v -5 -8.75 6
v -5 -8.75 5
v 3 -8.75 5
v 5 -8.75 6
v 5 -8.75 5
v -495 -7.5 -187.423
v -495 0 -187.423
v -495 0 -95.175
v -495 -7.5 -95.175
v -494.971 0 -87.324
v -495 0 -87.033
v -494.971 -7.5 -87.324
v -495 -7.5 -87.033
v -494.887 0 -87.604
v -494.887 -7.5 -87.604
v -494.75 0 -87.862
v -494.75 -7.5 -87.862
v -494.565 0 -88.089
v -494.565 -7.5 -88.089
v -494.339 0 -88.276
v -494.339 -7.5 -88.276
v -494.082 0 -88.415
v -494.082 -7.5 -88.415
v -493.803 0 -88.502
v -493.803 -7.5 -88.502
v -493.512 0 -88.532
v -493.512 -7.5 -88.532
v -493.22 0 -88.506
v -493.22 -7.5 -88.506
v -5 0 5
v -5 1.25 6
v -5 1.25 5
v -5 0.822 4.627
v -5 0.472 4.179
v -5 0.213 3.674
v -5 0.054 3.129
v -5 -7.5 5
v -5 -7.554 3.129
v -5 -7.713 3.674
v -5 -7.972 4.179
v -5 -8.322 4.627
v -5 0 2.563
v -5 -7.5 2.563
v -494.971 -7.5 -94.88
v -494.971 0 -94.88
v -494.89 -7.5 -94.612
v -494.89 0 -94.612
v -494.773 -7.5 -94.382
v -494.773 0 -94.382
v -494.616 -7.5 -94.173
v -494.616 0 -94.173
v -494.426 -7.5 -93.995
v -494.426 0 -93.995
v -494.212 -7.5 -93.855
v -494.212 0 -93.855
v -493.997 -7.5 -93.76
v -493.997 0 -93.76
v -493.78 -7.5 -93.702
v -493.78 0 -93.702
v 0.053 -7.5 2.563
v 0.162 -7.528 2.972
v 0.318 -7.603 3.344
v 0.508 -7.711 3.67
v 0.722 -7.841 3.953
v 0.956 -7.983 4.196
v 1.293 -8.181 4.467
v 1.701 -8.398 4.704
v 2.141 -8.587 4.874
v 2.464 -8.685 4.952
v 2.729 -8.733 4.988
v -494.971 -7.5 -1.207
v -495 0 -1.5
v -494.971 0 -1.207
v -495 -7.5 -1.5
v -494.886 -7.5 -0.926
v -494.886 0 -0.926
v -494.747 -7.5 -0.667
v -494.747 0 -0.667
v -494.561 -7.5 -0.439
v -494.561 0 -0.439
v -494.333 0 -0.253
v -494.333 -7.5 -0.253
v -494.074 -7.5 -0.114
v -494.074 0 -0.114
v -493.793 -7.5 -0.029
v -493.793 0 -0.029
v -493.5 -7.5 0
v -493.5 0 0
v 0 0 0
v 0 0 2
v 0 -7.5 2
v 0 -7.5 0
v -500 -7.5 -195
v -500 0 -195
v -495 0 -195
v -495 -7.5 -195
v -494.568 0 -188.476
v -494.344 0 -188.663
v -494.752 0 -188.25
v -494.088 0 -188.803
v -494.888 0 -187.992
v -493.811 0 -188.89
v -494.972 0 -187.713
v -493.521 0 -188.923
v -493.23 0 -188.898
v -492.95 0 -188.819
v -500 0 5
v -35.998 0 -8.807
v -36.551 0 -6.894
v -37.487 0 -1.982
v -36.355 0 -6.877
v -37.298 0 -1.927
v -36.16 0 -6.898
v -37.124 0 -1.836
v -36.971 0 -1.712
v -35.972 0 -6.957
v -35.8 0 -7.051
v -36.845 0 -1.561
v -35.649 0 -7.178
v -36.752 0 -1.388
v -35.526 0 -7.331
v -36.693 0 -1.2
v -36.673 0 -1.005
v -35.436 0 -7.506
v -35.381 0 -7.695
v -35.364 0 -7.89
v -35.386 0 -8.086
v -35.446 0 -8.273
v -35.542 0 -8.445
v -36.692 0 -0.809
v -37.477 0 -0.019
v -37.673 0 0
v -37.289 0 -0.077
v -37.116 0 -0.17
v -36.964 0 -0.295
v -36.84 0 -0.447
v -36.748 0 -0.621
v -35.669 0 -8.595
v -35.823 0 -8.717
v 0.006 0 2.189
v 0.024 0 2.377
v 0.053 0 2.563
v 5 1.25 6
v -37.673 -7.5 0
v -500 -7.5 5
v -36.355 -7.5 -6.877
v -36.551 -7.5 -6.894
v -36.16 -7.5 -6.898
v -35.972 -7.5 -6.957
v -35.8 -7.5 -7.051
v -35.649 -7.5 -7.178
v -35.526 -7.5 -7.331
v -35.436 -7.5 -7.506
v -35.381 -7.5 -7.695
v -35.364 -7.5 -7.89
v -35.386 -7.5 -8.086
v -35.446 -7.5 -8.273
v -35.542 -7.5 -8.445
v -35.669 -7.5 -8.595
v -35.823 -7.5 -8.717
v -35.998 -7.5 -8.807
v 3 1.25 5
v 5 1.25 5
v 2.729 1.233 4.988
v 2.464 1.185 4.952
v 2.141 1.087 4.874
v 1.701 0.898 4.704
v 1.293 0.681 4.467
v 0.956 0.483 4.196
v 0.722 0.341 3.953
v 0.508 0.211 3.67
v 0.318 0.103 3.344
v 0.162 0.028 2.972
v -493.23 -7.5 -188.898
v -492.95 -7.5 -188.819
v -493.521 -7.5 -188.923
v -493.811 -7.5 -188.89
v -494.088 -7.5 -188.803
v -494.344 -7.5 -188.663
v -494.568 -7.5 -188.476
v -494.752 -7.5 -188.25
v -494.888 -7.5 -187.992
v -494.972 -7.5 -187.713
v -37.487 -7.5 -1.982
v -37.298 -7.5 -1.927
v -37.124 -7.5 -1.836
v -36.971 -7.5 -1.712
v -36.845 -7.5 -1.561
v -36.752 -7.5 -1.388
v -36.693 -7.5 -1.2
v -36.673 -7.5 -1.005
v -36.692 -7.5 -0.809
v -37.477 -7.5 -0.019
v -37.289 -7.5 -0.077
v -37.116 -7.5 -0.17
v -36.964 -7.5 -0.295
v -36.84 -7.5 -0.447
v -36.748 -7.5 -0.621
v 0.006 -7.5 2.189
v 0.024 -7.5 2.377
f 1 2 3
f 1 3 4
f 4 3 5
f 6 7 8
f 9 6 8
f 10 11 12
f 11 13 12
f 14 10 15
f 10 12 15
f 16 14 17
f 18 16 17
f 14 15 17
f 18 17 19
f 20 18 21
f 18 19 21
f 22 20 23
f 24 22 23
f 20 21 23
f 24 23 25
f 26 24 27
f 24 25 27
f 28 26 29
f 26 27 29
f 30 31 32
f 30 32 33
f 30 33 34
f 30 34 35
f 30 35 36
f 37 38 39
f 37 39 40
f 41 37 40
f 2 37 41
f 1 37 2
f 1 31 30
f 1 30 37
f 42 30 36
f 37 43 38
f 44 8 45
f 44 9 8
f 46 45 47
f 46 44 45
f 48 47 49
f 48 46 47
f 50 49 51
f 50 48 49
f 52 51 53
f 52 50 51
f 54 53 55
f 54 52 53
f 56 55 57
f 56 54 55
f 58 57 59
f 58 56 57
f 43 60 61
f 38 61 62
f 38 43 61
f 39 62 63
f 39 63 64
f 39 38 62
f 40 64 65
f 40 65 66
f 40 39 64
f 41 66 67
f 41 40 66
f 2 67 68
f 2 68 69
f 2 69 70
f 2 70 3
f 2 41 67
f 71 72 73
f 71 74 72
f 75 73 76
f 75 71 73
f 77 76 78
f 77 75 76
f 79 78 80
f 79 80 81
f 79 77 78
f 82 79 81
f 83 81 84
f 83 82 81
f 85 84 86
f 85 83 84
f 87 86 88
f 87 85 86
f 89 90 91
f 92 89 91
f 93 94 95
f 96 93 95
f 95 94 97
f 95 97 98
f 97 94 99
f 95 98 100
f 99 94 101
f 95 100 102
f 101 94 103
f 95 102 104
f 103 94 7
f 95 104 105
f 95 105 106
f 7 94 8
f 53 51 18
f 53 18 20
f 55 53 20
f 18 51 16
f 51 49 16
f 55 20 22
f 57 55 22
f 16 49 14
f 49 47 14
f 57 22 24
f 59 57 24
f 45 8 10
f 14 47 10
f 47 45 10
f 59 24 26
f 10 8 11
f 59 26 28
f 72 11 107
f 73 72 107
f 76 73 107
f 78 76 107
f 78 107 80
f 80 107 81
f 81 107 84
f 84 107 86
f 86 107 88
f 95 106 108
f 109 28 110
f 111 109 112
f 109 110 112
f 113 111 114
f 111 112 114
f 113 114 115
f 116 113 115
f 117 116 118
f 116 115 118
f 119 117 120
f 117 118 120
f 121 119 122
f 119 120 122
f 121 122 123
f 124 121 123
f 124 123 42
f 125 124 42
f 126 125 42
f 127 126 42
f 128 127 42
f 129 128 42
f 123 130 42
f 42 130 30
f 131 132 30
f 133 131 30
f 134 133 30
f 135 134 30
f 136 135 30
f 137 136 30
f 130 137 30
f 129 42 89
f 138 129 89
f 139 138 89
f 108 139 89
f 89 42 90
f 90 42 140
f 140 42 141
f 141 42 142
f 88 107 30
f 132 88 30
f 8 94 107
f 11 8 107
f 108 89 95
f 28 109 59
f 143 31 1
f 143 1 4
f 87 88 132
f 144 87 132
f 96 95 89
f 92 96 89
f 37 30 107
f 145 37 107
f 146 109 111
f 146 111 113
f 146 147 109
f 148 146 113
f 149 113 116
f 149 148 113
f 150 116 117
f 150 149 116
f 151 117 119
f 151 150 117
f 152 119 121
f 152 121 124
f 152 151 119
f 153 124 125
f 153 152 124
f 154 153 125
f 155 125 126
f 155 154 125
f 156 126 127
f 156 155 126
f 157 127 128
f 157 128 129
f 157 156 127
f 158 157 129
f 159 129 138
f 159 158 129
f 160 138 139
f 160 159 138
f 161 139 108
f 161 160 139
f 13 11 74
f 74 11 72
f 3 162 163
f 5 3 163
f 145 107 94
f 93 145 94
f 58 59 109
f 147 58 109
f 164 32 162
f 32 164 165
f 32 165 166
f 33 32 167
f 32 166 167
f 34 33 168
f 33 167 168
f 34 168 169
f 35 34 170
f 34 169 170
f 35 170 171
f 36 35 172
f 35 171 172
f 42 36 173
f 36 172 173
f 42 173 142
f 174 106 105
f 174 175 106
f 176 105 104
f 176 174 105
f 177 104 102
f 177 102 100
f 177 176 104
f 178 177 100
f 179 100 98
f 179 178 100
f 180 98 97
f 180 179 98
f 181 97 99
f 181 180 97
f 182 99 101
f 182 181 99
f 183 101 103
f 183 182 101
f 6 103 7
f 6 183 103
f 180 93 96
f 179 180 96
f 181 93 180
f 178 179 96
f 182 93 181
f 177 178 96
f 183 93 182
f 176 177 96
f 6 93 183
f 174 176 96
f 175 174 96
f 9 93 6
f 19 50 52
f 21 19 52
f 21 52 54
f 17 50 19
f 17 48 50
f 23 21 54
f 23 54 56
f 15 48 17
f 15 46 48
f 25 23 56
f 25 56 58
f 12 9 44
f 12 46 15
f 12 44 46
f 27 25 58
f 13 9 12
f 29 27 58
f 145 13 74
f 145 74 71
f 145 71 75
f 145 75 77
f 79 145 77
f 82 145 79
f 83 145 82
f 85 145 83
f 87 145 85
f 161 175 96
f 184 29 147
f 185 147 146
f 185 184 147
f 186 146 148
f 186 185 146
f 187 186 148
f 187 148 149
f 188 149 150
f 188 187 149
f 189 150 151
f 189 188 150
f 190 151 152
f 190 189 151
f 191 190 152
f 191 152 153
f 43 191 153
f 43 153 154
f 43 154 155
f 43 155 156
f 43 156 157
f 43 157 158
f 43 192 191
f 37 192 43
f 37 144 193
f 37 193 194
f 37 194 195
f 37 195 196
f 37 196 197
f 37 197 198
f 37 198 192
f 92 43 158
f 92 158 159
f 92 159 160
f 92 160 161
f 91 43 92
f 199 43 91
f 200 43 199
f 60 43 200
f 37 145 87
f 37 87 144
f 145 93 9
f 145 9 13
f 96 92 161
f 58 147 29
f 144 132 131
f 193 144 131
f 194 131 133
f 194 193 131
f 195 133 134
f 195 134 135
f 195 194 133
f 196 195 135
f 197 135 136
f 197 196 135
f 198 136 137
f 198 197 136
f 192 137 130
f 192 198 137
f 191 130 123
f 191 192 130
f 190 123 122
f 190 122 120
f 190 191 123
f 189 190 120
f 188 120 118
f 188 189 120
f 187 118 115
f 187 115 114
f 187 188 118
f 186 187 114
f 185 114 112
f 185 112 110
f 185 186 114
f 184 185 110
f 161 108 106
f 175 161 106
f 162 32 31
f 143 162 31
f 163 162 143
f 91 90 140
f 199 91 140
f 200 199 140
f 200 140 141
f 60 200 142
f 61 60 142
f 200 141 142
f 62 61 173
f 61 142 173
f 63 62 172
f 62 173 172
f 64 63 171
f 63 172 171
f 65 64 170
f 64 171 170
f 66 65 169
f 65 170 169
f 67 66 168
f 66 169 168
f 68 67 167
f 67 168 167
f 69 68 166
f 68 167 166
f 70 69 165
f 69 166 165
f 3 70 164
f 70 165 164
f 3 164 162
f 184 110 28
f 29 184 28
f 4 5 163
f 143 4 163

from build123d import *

# Parameters (mm, degrees)
F1_DEPTH     = 7.5
F2_R         = 1.5
F3_R         = 1.5
F4_F1_R      = 1
F4_F2_R      = 1
F5_W         = 10
F5_H         = 10
F6_DEPTH     = 1
F7_T1_DEPTH  = 5
F7_T3_DEPTH  = 7.5
F7_T9_DEPTH  = 11.0917464655
F7_T14_DEPTH = 15
F7_T22_DEPTH = 15
F7_T27_DEPTH = 11.0917464655


# Not quite as in the source:
# - a fillet or chamfer that OpenCascade refuses, or shapes differently, is made with other operations: its cross-section is extruded or revolved along the edge and cut away or added


with BuildPart() as f1:
    # F0 (on Front) → F1 (new body)
    with BuildSketch(Plane.XZ):
        Polygon((0, 0), (0, 5), (-14.5909318536, 5), (-495, 5), (-500, 5), (-500, 0), (-500, -195), (-495, -195), (-408.1860127931, -160.8005504943), align=None)
        Polygon((-26.1103633187, -4.911916504), (-410.018635385, -156.1485085302), (-495, -189.6260158027), (-495, -142.4539996661), (-495, -95.2819835295), (-495, -93.9333955313), (-494.06737982, -93.7563320577), align=None, mode=Mode.SUBTRACT)
        Polygon((-495, 0), (-27.044750547, 0), (-495, -88.8440800691), (-495, -44.4220400346), align=None, mode=Mode.SUBTRACT)
    extrude(amount=F1_DEPTH)

    # F2
    f2_edges = [f1.edges().sort_by_distance(p)[0] for p in [
        (-495, -3.75, -88.84408),
    ]]
    fillet(f2_edges, radius=F2_R)

    # F3
    f3_edges = [f1.edges().sort_by_distance(p)[0] for p in [
        (-495, -3.75, -93.933396),
        (-495, -3.75, 0),
        (-495, -3.75, -189.626016),
    ]]
    fillet(f3_edges, radius=F3_R)

    # F4: fillet of radius 1 on 2 edges, made by hand

    # F4_f1
    f4_f1_edges = [f1.edges().sort_by_distance(p)[0] for p in [
        (-27.044750547, -3.75, 0),
    ]]
    fillet(f4_f1_edges, radius=F4_F1_R)

    # F4_f2
    f4_f2_edges = [f1.edges().sort_by_distance(p)[0] for p in [
        (-26.1103633187, -3.75, -4.911916504),
    ]]
    fillet(f4_f2_edges, radius=F4_F2_R)

    # F5 (on face) → F6 (join)
    with BuildSketch(Plane.XY.offset(5)):
        with Locations((0, -3.75)):
            Rectangle(F5_W, F5_H)
    extrude(amount=F6_DEPTH)

    # F7: fillet of radius 3 on 3 edges, made by hand

    # F7_s2 → F7_t1 (join)
    with BuildSketch(Plane.YZ.offset(-5)):
        with BuildLine():
            ThreePointArc((-7.5, 2.5633014138), (-7.830730437, 3.9326078076), (-8.75, 5))
            Line((-8.75, 5), (-7.5, 5))
            Line((-7.5, 5), (-7.5, 2.5633014138))
        make_face()
        with BuildLine():
            ThreePointArc((1.25, 5), (0.330730437, 3.9326078076), (0, 2.5633014138))
            Line((0, 2.5633014138), (0, 5))
            Line((0, 5), (1.25, 5))
        make_face()
    extrude(amount=F7_T1_DEPTH)

    # F7_s4 → F7_t3 (join)
    with BuildSketch(Plane.XZ):
        with BuildLine():
            ThreePointArc((0, 2), (0.8786796564, 4.1213203436), (3, 5))
            Line((3, 5), (0, 5))
            Line((0, 5), (0, 2))
        make_face()
    extrude(amount=F7_T3_DEPTH)


with BuildPart() as f7_tool7:
    # F7_s8 → F7_t9 (new body)
    with BuildSketch(Plane.YZ.offset(-5)):
        with BuildLine():
            ThreePointArc((-7.5, 2.5633014138), (-7.830730437, 3.9326078076), (-8.75, 5))
            Line((-8.75, 5), (-7.5, 5))
            Line((-7.5, 5), (-7.5, 2.5633014138))
        make_face()
    extrude(amount=F7_T9_DEPTH)

    split(bisect_by=Plane.YZ, keep=Keep.TOP)

    split(bisect_by=Plane.YZ.offset(5), keep=Keep.BOTTOM)


with BuildPart() as f7_tool12:
    # F7_s13 → F7_t14 (new body)
    with BuildSketch(Plane.XZ):
        with BuildLine():
            ThreePointArc((0, 2), (0.8786796564, 4.1213203436), (3, 5))
            Line((3, 5), (0, 5))
            Line((0, 5), (0, 2))
        make_face()
    extrude(amount=F7_T14_DEPTH)

    split(bisect_by=Plane.XZ.offset(7.5), keep=Keep.TOP)

    split(bisect_by=Plane.XZ.offset(8.75), keep=Keep.BOTTOM)


with BuildPart() as f7_tool7_1:
    add(f7_tool7.part)

    # F7_t17: intersect F7_tool12
    add(f7_tool12.part, mode=Mode.INTERSECT)


with BuildPart() as f1_1:
    add(f1.part)

    # F7_t5: union F7_tool7
    add(f7_tool7_1.part)


with BuildPart() as f7_tool20:
    # F7_s21 → F7_t22 (new body)
    with BuildSketch(Plane.XZ.offset(-7.5)):
        with BuildLine():
            ThreePointArc((0, 2), (0.8786796564, 4.1213203436), (3, 5))
            Line((3, 5), (0, 5))
            Line((0, 5), (0, 2))
        make_face()
    extrude(amount=F7_T22_DEPTH)

    split(bisect_by=Plane.XZ, keep=Keep.BOTTOM)

    split(bisect_by=Plane.XZ.offset(-1.25), keep=Keep.TOP)


with BuildPart() as f7_tool25:
    # F7_s26 → F7_t27 (new body)
    with BuildSketch(Plane.YZ.offset(6.0917464655)):
        with BuildLine():
            ThreePointArc((1.25, 5), (0.330730437, 3.9326078076), (0, 2.5633014138))
            Line((0, 2.5633014138), (0, 5))
            Line((0, 5), (1.25, 5))
        make_face()
    extrude(amount=-F7_T27_DEPTH)

    split(bisect_by=Plane.YZ, keep=Keep.TOP)

    split(bisect_by=Plane.YZ.offset(5), keep=Keep.BOTTOM)


with BuildPart() as f7_tool20_1:
    add(f7_tool20.part)

    # F7_t30: intersect F7_tool25
    add(f7_tool25.part, mode=Mode.INTERSECT)


with BuildPart() as f1_2:
    add(f1_1.part)

    # F7_t18: union F7_tool20
    add(f7_tool20_1.part)


solid = f1_2.part
